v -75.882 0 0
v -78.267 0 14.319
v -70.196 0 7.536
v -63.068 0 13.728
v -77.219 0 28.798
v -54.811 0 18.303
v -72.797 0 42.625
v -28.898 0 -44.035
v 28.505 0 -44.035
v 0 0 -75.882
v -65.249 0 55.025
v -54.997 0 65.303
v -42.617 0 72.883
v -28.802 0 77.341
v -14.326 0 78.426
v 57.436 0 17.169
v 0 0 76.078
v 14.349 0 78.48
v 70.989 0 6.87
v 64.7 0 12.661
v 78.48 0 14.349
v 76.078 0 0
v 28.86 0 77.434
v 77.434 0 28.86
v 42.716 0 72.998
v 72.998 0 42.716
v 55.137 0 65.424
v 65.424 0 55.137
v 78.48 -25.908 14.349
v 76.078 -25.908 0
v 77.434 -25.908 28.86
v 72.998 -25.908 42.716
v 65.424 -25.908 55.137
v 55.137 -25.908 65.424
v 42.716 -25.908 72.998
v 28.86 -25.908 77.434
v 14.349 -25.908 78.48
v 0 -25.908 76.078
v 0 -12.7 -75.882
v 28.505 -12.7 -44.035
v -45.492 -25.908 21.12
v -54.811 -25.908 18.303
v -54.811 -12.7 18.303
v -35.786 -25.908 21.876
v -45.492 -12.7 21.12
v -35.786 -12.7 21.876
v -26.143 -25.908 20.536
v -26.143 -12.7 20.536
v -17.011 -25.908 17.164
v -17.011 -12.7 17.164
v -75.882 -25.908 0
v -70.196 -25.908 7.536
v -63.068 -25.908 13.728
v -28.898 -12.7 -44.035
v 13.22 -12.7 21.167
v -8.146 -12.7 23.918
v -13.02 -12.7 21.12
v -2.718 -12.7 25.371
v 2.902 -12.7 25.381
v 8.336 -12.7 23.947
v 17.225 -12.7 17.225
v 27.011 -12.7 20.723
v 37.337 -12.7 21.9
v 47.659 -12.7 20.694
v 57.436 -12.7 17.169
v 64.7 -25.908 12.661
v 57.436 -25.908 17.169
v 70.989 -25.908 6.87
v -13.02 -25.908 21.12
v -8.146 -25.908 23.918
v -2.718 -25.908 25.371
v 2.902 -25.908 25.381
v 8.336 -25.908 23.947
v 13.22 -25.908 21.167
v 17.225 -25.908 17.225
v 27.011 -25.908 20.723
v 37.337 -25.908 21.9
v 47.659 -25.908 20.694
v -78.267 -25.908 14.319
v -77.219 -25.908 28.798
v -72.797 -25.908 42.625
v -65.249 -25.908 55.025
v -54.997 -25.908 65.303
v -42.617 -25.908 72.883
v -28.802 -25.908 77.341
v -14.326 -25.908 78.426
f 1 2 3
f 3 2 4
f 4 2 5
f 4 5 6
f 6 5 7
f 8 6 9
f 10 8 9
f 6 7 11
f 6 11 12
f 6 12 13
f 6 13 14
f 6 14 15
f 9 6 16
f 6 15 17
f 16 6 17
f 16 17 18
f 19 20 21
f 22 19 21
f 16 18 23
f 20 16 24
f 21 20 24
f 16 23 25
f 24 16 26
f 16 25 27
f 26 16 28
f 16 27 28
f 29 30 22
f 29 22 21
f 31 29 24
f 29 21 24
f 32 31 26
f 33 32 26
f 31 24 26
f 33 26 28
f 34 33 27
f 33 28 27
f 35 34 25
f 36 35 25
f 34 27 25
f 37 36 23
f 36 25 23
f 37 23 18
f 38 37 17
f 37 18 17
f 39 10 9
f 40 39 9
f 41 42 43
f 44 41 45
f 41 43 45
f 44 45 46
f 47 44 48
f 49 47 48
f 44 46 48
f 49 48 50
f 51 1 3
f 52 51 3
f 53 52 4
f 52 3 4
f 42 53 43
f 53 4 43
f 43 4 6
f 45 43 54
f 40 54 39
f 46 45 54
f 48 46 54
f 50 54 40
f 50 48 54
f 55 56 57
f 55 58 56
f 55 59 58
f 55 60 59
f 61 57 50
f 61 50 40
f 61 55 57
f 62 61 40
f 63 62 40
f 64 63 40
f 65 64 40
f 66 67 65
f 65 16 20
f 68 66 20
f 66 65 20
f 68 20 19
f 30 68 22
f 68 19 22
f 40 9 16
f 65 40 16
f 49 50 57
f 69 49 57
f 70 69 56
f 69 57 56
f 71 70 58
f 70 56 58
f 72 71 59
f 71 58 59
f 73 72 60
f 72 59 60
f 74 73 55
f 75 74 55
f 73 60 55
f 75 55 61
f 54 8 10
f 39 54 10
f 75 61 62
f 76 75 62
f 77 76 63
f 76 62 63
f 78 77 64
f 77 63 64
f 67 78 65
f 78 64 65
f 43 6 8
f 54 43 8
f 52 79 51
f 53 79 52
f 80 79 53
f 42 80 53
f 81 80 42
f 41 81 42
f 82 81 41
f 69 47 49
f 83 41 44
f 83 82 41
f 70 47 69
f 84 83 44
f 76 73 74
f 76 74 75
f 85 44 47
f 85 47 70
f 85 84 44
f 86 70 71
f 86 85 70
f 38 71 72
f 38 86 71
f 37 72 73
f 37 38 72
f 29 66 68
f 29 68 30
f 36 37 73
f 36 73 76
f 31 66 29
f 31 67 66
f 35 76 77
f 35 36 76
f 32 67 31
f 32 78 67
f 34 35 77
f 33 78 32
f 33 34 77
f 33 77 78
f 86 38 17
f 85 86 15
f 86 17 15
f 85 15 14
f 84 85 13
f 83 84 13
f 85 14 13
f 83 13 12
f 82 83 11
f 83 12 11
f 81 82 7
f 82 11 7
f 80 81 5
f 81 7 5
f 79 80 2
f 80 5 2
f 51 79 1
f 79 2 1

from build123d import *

# Parameters (mm, degrees)
F1_DEPTH = 25.908
F2_DEPTH = 12.7


with BuildPart() as f1:
    # F0 (on Front) → F1 (new body)
    with BuildSketch(Plane.XZ):
        with BuildLine():
            ThreePointArc((76.078311, 0), (60.586504, 60.586503), (0, 76.078303))
            ThreePointArc((0, 76.078303), (-60.428131, 60.468316), (-75.88172, 0))
            ThreePointArc((-75.88172, 0), (-66.794103, 10.818617), (-54.810586, 18.303441))
            ThreePointArc((-54.810586, 18.303441), (-35.786004, 21.875966), (-17.011248, 17.163621))
            ThreePointArc((-17.011248, 17.163621), (0.091962, 25.558459), (17.225309, 17.225304))
            ThreePointArc((17.225309, 17.225304), (37.337078, 21.900148), (57.435773, 17.169411))
            ThreePointArc((57.435773, 17.169411), (67.981444, 9.91416), (76.078311, 0))
        make_face()
    extrude(amount=F1_DEPTH)

    # F0 (on Front) → F2 (join)
    with BuildSketch(Plane.XZ):
        with BuildLine():
            ThreePointArc((76.078311, 0), (60.586504, 60.586503), (0, 76.078303))
            ThreePointArc((0, 76.078303), (-60.428131, 60.468316), (-75.88172, 0))
            ThreePointArc((-75.88172, 0), (-66.794103, 10.818617), (-54.810586, 18.303441))
            ThreePointArc((-54.810586, 18.303441), (-35.786004, 21.875966), (-17.011248, 17.163621))
            ThreePointArc((-17.011248, 17.163621), (0.091962, 25.558459), (17.225309, 17.225304))
            ThreePointArc((17.225309, 17.225304), (37.337078, 21.900148), (57.435773, 17.169411))
            ThreePointArc((57.435773, 17.169411), (67.981444, 9.91416), (76.078311, 0))
        make_face()
        with BuildLine():
            ThreePointArc((-17.011248, 17.163621), (-35.786004, 21.875966), (-54.810586, 18.303441))
            Line((-54.810586, 18.303441), (-28.897962, -44.034988))
            Line((-28.897962, -44.034988), (0.131057, 3.85879))
            Line((0.131057, 3.85879), (28.504791, -44.034988))
            Line((28.504791, -44.034988), (57.435773, 17.169411))
            ThreePointArc((57.435773, 17.169411), (37.337078, 21.900148), (17.225309, 17.225304))
            ThreePointArc((17.225309, 17.225304), (0.091962, 25.558459), (-17.011248, 17.163621))
        make_face()
        Polygon((0.131057, 3.85879), (-28.897962, -44.034988), (0, -75.88172), (28.504791, -44.034988), align=None)
    extrude(amount=F2_DEPTH)


solid = f1.part
